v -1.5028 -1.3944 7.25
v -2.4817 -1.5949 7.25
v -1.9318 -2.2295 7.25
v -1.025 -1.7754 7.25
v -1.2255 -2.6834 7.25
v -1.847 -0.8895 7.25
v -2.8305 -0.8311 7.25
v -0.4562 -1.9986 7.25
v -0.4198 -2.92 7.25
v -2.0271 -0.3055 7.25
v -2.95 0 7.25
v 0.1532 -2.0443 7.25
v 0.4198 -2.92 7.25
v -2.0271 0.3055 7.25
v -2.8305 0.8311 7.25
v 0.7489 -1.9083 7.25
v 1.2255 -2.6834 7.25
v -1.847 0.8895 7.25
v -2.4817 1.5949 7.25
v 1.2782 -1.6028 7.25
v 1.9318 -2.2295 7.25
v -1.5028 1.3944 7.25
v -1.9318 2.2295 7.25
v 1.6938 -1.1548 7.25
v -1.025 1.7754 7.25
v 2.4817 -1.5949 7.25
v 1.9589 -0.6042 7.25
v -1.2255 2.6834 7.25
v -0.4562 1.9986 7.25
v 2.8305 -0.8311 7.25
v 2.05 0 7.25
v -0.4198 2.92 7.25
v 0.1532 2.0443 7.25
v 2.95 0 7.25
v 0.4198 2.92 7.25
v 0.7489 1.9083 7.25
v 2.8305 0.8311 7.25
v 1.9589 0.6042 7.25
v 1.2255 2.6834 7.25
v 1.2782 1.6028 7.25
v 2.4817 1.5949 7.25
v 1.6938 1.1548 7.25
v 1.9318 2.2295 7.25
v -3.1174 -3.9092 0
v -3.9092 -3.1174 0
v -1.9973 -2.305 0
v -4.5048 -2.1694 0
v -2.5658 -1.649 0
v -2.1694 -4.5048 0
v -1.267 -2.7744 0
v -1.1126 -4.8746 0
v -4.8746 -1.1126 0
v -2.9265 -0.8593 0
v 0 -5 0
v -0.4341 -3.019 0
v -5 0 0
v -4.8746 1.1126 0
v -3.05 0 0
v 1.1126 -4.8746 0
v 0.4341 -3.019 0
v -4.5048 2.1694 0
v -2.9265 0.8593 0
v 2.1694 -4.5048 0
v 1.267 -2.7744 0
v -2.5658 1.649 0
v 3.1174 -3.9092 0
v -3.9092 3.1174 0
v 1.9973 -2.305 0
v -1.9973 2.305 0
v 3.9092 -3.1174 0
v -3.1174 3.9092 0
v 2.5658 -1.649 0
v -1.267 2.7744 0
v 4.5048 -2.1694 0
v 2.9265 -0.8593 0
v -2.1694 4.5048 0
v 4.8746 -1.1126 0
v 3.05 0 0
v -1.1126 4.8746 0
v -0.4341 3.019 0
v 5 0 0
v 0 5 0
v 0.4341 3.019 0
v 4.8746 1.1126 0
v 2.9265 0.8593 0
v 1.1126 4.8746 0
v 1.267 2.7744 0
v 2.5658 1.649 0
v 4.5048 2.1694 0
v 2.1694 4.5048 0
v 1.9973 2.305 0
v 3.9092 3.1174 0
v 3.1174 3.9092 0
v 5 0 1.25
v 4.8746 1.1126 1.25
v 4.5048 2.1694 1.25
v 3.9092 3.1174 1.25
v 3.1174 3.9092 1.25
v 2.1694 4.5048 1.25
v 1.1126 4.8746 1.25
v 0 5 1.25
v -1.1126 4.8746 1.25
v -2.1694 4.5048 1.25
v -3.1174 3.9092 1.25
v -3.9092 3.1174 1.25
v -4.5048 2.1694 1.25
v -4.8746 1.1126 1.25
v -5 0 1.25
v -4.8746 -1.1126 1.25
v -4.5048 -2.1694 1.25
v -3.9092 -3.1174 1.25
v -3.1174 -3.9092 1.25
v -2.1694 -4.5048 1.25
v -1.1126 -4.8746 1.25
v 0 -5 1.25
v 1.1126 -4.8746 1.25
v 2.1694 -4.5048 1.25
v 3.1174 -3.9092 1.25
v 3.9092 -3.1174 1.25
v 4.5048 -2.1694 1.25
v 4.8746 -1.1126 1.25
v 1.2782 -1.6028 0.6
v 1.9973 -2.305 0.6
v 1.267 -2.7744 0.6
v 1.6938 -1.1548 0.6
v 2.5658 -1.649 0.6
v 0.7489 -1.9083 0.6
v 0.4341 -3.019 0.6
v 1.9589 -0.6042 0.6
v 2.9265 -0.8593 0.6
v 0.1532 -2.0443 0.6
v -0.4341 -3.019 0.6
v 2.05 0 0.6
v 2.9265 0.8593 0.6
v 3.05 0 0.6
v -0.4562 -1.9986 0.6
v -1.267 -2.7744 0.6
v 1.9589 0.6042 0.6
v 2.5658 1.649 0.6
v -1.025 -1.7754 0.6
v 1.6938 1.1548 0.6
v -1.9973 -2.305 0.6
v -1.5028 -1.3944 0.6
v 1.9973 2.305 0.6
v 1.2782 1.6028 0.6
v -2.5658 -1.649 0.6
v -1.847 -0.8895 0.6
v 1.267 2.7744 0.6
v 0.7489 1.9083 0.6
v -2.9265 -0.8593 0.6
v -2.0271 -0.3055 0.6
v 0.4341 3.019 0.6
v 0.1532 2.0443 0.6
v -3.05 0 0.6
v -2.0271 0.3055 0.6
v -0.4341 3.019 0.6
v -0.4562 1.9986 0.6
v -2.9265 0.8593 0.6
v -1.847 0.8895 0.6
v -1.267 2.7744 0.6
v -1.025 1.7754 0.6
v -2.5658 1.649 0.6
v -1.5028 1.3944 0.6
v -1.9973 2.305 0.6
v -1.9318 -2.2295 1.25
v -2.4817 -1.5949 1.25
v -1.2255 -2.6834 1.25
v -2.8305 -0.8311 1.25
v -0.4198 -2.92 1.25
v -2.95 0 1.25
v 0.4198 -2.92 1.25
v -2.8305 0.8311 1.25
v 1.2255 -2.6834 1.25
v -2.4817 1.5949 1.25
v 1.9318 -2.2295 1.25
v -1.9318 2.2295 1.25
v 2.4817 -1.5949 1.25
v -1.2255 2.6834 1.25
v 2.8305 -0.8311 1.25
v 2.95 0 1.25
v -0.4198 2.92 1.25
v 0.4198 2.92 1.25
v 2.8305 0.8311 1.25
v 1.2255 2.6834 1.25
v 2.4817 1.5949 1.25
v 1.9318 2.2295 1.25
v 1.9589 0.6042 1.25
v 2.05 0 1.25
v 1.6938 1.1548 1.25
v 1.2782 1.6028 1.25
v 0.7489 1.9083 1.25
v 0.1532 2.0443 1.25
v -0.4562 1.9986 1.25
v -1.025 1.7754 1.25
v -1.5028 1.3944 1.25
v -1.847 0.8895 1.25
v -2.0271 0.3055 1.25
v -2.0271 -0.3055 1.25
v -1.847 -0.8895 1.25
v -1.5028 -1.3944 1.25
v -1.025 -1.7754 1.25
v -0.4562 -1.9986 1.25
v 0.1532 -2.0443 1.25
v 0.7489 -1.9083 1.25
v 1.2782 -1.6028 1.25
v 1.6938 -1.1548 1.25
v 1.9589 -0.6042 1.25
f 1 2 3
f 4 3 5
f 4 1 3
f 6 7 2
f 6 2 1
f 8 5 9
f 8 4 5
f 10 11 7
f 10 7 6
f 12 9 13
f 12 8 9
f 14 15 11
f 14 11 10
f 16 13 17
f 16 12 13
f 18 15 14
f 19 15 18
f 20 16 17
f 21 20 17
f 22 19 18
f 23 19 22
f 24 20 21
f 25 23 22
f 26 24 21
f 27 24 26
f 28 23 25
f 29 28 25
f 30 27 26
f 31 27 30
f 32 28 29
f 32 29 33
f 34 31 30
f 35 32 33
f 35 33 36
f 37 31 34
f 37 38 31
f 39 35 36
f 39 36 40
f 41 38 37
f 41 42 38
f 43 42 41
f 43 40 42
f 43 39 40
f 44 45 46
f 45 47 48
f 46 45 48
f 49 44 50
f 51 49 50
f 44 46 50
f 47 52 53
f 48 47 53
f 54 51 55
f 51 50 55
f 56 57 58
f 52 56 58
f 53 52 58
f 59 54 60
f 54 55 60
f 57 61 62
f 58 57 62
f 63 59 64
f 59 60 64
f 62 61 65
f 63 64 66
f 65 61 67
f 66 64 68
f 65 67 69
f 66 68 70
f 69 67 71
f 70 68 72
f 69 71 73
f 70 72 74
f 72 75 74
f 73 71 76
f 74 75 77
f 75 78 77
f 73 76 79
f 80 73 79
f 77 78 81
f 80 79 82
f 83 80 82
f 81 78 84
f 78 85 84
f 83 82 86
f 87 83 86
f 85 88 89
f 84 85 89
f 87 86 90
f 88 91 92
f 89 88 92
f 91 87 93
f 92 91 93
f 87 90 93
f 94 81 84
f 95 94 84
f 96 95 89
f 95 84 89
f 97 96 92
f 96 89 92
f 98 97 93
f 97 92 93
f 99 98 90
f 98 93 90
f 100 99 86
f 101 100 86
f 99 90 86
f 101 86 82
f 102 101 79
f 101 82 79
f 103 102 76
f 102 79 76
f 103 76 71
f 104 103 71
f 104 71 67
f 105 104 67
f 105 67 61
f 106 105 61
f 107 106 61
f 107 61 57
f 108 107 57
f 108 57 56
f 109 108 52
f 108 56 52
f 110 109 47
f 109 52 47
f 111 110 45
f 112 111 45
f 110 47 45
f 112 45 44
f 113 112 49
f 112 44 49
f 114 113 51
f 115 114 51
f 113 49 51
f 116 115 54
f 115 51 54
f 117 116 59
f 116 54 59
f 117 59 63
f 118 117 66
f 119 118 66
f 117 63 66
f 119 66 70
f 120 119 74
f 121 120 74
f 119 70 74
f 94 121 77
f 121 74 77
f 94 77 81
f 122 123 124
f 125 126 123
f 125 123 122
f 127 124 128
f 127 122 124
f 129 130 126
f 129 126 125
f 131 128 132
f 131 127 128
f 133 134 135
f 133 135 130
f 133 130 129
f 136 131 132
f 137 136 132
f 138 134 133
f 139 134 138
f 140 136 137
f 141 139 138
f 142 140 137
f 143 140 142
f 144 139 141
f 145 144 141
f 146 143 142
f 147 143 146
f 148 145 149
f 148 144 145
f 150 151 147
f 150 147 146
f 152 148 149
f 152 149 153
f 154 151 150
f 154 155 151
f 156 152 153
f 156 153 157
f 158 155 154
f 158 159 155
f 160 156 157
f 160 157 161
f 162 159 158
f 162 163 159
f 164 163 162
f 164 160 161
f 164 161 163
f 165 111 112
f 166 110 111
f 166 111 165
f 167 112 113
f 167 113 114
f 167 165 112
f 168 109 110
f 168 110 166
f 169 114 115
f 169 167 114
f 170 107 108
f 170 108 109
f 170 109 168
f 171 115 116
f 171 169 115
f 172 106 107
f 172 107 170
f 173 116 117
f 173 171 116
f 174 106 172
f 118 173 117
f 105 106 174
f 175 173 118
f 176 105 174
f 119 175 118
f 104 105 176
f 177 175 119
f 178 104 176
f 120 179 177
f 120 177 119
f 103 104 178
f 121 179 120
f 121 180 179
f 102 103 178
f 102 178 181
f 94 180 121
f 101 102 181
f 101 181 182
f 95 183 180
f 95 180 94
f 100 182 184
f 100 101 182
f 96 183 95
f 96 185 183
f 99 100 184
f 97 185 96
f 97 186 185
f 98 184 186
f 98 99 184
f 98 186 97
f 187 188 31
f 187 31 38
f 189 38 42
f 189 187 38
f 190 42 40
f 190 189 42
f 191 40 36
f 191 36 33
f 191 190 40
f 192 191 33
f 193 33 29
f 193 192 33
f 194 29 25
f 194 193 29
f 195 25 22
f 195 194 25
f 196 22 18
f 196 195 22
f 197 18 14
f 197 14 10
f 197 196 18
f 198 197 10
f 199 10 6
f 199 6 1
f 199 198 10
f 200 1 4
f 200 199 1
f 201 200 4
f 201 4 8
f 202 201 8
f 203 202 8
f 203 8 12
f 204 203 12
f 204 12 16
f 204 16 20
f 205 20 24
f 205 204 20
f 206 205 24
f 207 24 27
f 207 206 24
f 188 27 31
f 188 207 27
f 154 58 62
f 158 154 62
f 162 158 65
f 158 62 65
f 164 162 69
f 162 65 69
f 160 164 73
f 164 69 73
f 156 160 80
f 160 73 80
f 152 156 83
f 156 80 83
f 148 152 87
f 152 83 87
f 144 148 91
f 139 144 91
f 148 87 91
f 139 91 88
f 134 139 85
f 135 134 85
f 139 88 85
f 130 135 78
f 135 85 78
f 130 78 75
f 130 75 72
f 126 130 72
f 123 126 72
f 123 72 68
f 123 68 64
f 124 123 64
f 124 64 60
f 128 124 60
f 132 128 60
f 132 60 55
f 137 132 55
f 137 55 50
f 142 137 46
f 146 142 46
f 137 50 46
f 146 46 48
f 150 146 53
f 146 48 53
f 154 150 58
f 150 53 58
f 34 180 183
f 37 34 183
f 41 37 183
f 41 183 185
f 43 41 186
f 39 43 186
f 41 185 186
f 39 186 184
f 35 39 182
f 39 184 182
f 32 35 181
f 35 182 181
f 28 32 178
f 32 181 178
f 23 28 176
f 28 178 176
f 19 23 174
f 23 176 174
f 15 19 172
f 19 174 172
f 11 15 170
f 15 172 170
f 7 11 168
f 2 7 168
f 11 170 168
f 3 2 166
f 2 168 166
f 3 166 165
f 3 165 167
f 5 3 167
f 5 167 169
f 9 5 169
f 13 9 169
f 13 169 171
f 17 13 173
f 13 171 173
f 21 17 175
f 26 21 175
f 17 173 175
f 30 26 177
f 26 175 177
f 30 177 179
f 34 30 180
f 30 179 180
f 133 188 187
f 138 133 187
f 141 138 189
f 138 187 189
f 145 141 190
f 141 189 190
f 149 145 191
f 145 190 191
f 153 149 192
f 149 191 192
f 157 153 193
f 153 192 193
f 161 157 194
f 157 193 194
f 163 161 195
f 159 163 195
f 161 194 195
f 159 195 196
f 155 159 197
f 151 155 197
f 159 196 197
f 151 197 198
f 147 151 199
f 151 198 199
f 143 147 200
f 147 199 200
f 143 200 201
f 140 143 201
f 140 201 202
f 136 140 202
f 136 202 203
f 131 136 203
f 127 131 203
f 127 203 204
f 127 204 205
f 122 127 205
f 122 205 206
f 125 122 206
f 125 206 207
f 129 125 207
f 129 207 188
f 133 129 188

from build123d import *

# Parameters (mm, degrees)
SKETCH1_R           = 5
BOSS_EXTRUDE1_DEPTH = 1.25
SKETCH2_R           = 2.95
SKETCH2_R_2         = 2.05
BOSS_EXTRUDE2_DEPTH = 6
SKETCH4_R           = 2.05
CUT_EXTRUDE3_DEPTH  = 2.25
SKETCH5_R           = 3.05
CUT_EXTRUDE4_DEPTH  = 0.6


with BuildPart() as part:
    # Sketch1 → Boss-Extrude1 (new body)
    with BuildSketch(Plane.XY):
        Circle(SKETCH1_R)
    extrude(amount=BOSS_EXTRUDE1_DEPTH)

    # Sketch2 → Boss-Extrude2 (add)
    with BuildSketch(Plane.XY.offset(1.25)):
        Circle(SKETCH2_R)
        Circle(SKETCH2_R_2, mode=Mode.SUBTRACT)
    extrude(amount=BOSS_EXTRUDE2_DEPTH)

    # Sketch4 → Cut-Extrude3 (cut, through all)
    with BuildSketch(Plane.XY.offset(1.25)):
        Circle(SKETCH4_R)
    extrude(amount=-CUT_EXTRUDE3_DEPTH, mode=Mode.SUBTRACT)

    # Sketch5 → Cut-Extrude4 (cut)
    with BuildSketch(Plane(origin=(0, 0, 0), x_dir=(-1, 0, 0), z_dir=(0, 0, -1))):
        Circle(SKETCH5_R)
    extrude(amount=-CUT_EXTRUDE4_DEPTH, mode=Mode.SUBTRACT)


solid = part.part
